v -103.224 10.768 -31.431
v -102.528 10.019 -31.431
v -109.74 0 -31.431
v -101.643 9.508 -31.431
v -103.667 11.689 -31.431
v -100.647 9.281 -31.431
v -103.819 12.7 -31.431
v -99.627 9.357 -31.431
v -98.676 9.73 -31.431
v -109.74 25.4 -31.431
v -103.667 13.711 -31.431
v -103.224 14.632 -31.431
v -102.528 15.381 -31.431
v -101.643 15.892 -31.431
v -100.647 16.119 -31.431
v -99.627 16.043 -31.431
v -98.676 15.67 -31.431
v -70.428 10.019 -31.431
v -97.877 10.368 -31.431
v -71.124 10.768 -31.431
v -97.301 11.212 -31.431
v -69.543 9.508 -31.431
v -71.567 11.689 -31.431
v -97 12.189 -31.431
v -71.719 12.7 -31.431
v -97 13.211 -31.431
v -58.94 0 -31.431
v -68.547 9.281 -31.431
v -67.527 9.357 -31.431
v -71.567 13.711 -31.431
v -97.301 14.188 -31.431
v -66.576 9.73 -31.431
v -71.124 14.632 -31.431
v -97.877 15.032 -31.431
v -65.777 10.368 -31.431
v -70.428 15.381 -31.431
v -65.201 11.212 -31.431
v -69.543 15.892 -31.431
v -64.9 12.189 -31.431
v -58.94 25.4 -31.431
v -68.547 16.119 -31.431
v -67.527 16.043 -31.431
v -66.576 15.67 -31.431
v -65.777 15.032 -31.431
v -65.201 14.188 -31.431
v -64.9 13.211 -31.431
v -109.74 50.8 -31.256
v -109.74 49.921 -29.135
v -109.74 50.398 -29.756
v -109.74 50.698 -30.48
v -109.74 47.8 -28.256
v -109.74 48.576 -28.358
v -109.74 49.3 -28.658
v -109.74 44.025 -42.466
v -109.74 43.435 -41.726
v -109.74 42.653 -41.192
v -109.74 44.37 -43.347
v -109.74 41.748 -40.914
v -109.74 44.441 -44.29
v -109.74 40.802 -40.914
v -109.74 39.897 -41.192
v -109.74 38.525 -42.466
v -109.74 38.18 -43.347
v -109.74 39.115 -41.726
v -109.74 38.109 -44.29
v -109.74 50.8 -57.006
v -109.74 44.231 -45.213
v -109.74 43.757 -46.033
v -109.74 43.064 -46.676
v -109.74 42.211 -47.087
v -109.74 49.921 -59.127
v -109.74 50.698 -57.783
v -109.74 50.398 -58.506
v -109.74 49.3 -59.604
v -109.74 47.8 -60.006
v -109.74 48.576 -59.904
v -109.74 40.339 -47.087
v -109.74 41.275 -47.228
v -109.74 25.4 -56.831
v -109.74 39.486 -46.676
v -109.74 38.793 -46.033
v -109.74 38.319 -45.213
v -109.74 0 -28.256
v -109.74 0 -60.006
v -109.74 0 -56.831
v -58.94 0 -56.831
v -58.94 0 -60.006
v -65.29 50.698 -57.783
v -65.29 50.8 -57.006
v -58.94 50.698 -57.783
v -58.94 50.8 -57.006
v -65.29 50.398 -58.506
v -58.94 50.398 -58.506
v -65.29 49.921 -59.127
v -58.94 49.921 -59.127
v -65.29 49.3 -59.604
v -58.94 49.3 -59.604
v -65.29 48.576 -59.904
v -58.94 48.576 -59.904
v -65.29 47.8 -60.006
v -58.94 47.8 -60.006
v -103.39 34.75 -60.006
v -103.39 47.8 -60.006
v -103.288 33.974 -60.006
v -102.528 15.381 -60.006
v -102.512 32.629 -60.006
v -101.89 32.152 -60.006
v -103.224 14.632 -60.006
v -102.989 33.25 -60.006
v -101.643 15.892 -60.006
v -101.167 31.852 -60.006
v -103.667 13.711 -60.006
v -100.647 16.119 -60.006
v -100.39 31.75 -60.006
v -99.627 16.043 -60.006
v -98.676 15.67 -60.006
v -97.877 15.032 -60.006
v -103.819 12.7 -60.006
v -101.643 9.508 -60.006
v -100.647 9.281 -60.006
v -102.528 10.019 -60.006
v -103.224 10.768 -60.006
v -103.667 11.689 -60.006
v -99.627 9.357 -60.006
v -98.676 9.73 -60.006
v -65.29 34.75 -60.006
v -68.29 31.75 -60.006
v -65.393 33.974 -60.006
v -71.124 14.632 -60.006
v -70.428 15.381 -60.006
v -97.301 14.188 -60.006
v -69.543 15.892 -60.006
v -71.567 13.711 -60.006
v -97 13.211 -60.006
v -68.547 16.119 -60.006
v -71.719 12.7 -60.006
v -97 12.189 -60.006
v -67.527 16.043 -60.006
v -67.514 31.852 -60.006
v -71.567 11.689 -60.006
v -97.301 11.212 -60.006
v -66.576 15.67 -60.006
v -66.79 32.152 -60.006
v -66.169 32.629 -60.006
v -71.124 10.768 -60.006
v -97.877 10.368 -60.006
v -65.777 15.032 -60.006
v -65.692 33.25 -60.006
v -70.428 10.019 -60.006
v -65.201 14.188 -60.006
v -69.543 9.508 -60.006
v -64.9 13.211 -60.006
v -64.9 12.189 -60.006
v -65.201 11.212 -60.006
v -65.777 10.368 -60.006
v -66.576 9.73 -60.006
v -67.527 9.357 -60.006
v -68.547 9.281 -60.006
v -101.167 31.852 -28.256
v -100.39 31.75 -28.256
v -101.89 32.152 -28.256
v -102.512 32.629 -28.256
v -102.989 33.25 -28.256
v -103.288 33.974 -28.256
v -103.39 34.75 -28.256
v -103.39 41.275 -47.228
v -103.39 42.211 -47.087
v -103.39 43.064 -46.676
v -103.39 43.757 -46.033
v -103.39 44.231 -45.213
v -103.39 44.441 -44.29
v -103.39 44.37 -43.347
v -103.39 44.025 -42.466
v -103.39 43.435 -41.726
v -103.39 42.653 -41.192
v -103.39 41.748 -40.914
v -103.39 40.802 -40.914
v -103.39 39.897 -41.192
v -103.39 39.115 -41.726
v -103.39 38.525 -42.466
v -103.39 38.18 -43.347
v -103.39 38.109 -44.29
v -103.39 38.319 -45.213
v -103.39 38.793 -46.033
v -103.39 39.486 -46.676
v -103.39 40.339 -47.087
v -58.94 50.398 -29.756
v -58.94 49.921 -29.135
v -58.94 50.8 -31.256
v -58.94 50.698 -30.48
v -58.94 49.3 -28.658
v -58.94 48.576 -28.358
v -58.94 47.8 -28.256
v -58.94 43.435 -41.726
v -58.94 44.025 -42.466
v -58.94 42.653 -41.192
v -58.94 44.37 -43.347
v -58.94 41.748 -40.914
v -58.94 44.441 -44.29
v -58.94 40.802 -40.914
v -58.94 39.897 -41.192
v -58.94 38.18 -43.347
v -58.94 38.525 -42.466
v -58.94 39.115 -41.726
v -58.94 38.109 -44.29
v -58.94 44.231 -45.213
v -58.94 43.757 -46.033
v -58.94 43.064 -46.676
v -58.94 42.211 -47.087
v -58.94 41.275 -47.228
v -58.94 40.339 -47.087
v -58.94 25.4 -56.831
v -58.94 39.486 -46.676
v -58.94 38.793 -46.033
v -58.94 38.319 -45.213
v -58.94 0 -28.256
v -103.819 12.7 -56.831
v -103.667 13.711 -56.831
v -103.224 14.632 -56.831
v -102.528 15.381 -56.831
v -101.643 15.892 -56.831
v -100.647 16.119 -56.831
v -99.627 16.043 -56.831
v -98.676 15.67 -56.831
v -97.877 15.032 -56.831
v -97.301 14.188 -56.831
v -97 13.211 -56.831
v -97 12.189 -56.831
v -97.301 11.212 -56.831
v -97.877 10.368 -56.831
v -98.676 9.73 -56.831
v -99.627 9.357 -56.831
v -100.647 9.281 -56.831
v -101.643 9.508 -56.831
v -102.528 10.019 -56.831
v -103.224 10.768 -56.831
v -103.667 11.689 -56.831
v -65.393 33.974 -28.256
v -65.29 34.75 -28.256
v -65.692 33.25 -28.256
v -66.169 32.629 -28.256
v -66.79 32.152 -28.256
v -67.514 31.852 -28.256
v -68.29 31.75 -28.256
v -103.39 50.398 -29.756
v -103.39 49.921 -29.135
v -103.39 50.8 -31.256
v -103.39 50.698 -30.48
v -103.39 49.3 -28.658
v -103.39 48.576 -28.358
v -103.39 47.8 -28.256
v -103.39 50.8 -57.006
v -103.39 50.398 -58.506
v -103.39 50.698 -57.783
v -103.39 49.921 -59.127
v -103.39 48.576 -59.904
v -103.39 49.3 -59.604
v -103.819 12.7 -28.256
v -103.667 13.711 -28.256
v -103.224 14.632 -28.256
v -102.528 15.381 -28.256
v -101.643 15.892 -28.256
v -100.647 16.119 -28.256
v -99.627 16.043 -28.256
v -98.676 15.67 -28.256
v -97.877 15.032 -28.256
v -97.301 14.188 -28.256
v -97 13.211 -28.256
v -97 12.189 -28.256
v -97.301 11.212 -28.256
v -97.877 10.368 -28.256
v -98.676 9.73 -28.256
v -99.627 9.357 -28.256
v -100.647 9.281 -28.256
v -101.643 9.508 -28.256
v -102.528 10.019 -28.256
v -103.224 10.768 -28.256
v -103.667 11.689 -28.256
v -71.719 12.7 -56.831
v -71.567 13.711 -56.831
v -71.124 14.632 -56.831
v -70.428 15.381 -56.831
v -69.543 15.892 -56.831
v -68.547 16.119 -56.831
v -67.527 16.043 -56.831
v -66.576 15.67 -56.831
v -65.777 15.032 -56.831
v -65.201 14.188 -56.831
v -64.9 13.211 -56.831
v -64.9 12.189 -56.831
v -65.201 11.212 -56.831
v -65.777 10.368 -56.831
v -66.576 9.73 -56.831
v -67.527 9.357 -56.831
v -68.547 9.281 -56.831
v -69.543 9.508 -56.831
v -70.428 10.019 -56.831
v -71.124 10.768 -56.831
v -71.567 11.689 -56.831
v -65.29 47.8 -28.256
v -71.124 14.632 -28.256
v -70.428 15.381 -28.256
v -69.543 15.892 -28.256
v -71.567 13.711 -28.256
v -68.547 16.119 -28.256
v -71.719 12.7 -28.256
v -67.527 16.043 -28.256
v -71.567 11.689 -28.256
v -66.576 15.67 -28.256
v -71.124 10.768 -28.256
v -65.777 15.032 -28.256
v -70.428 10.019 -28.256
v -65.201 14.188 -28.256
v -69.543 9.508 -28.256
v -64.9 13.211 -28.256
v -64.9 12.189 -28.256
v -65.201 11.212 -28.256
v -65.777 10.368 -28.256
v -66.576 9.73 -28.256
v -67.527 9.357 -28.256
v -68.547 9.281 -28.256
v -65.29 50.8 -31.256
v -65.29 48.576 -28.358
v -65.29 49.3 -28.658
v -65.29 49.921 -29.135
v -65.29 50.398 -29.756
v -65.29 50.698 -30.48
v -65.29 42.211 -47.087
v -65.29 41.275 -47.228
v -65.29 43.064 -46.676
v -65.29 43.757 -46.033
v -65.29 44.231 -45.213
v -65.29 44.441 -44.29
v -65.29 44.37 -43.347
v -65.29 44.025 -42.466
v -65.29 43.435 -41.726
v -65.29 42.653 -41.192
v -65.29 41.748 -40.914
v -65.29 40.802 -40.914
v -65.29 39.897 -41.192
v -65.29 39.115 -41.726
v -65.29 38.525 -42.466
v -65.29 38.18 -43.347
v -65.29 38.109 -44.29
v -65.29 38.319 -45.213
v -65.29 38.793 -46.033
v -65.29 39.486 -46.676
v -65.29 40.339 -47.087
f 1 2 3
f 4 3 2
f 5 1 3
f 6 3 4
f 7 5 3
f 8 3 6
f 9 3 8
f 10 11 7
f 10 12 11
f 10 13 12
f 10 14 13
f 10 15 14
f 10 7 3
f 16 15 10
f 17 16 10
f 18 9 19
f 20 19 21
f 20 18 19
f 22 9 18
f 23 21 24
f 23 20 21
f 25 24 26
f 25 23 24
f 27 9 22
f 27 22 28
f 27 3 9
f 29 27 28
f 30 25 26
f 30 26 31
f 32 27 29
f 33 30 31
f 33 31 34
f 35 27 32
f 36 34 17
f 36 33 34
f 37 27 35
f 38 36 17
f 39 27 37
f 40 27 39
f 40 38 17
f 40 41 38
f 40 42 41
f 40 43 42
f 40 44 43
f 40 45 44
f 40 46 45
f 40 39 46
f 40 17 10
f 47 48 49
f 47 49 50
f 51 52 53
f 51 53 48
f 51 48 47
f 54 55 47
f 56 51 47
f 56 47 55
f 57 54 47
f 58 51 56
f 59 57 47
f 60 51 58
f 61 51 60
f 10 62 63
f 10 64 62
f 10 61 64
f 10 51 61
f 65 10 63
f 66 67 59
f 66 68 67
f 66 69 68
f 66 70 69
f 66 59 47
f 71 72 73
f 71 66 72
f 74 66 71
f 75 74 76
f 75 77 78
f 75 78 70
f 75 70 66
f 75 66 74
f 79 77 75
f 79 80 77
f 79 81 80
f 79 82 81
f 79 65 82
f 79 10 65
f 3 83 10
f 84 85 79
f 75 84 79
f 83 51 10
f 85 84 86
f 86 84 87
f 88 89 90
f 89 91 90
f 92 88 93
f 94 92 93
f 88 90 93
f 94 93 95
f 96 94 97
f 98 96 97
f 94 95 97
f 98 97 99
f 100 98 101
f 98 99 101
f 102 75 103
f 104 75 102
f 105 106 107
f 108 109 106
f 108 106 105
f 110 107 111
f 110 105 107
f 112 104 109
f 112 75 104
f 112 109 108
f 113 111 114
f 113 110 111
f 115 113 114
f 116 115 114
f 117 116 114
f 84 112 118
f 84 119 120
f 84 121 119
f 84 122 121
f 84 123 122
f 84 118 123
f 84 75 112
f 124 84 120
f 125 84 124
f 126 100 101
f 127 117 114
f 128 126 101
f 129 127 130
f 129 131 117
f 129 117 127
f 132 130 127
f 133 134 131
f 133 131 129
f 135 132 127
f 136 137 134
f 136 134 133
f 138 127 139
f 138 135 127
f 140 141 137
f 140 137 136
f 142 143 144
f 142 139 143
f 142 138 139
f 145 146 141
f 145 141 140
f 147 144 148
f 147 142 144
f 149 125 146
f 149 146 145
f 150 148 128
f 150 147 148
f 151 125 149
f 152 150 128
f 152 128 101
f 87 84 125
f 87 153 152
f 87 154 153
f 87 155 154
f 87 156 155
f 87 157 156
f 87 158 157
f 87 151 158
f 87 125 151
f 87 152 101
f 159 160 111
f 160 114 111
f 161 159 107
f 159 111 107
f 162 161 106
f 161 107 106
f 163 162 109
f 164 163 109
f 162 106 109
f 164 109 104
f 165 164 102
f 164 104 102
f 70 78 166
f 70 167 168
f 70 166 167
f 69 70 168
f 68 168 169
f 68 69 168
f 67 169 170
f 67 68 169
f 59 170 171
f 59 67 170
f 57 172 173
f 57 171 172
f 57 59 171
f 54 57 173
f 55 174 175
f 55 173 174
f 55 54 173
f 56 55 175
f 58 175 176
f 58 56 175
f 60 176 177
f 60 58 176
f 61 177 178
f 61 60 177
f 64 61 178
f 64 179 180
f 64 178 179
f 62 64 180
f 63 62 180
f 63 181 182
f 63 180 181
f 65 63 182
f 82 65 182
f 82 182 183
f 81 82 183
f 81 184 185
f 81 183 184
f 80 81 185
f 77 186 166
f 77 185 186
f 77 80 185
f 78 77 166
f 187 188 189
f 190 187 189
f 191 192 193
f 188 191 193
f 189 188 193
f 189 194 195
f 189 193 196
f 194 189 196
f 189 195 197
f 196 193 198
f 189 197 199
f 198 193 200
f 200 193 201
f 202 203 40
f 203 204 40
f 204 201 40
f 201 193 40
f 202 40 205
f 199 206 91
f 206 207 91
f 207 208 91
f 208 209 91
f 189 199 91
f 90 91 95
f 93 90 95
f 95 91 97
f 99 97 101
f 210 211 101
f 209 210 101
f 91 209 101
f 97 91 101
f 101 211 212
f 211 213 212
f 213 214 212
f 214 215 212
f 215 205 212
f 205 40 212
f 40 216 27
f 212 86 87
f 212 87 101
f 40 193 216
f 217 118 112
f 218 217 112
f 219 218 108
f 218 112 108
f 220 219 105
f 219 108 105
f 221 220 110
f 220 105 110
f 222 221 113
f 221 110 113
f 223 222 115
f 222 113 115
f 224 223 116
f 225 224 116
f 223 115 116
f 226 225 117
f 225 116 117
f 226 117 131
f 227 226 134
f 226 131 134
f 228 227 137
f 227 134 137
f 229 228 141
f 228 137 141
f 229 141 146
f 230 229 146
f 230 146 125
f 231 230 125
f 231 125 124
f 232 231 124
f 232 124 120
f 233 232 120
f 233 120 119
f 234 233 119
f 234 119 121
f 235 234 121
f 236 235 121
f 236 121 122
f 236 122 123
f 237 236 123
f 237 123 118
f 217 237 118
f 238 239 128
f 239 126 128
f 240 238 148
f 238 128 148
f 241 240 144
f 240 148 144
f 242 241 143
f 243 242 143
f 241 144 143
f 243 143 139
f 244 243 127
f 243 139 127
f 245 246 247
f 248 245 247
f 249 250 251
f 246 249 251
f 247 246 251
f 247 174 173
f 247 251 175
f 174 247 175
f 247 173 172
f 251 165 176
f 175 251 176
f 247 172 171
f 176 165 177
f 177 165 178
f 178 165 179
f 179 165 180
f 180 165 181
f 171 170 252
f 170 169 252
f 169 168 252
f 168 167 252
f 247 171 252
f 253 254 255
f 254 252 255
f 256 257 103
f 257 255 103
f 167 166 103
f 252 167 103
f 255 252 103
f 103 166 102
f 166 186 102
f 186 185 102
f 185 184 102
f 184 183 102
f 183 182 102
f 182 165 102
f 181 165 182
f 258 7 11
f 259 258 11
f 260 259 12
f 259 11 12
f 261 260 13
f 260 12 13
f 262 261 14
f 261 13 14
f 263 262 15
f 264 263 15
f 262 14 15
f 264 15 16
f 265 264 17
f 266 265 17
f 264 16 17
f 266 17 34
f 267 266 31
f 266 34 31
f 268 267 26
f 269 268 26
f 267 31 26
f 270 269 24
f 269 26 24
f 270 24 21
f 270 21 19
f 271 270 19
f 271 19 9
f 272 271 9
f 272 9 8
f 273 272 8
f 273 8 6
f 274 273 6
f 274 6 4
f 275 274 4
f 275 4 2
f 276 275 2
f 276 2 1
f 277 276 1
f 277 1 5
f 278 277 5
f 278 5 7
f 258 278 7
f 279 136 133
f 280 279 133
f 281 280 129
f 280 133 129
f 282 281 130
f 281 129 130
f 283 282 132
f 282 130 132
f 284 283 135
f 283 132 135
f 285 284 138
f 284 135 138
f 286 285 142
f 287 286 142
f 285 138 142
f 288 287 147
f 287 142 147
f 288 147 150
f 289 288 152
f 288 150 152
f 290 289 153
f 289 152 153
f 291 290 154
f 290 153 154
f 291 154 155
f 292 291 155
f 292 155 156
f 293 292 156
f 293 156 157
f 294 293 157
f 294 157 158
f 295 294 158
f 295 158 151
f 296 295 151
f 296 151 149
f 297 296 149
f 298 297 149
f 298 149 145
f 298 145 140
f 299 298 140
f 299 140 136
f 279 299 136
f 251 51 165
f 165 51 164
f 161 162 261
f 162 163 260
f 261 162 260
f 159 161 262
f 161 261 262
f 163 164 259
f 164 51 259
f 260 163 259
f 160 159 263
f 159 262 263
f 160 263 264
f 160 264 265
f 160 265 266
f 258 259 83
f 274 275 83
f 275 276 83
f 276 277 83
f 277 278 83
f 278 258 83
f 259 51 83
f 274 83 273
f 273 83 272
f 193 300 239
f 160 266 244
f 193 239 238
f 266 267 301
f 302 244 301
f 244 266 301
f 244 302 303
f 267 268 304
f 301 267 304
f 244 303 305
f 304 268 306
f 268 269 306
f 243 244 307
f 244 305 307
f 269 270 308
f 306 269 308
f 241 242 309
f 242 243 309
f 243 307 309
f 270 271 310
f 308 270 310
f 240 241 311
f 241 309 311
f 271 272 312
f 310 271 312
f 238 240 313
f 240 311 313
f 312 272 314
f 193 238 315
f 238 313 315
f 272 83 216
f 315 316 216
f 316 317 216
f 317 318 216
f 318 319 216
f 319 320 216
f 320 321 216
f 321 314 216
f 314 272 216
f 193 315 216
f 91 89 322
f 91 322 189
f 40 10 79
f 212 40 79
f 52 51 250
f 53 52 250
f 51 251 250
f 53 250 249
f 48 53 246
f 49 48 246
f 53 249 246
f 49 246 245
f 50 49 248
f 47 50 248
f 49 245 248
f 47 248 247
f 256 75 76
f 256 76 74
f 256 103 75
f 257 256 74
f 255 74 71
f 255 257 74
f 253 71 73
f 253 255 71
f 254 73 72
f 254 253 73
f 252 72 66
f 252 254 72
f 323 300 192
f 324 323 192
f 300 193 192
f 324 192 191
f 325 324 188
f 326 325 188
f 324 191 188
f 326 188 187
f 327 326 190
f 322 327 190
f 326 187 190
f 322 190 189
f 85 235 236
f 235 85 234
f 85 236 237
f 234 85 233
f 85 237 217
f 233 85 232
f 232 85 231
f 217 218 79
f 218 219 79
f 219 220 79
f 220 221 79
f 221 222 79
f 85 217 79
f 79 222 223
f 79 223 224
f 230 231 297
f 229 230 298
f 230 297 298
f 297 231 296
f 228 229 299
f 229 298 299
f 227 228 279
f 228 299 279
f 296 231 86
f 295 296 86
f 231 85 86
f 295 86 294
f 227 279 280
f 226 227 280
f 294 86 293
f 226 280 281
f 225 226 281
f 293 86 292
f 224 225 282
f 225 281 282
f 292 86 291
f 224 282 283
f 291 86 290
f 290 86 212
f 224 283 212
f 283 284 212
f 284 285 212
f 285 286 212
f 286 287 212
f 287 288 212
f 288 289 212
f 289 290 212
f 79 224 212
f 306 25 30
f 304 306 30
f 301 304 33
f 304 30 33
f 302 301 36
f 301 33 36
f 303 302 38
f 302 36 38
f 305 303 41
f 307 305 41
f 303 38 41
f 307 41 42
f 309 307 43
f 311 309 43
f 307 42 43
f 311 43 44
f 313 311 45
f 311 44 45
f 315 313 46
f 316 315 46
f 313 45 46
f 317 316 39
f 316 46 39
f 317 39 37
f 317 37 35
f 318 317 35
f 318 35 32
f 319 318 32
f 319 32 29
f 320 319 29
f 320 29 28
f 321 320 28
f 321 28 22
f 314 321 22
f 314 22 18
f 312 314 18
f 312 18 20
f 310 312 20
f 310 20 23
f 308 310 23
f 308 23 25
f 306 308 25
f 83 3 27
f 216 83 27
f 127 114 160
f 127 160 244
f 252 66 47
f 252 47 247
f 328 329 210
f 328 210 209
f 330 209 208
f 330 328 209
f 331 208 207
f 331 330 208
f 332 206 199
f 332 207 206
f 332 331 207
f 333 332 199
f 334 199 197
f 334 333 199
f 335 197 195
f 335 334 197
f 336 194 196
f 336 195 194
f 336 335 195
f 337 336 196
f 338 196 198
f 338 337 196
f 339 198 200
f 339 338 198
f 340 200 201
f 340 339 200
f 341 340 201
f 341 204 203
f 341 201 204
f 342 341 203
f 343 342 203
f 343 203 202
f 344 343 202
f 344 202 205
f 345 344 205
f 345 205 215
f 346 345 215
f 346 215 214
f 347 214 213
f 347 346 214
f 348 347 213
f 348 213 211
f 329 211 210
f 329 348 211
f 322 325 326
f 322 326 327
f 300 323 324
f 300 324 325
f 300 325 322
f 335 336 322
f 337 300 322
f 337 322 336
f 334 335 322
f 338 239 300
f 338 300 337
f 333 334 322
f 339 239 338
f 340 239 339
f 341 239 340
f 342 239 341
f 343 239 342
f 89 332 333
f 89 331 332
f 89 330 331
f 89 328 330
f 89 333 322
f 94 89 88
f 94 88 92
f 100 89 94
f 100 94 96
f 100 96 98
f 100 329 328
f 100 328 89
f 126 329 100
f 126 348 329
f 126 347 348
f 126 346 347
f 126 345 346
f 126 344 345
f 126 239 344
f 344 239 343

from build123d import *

# Parameters (mm, degrees)
SKETCH1_W               = 50.8
SKETCH1_H               = 31.75
BOSS_EXTRUDE1_DEPTH     = 31.75
SKETCH2_W               = 25.4
SKETCH2_H               = 25.4
CUT_EXTRUDE1_DEPTH      = 85.79053849
SKETCH3_W               = 6.35
SKETCH3_H               = 31.75
BOSS_EXTRUDE2_DEPTH     = 19.05
SKETCH4_W               = 6.35
SKETCH4_H               = 31.75
BOSS_EXTRUDE3_DEPTH     = 19.05
CUT_EXTRUDE2_DEPTH      = 91.317082645
CUT_EXTRUDE2_DEPTH_BACK = 91.317082645
SKETCH5_R               = 3.175
FILLET1_R               = 3
SKETCH6_R               = 3.429
CUT_EXTRUDE3_DEPTH      = 126.026704643
SKETCH7_R               = 3.429
CUT_EXTRUDE4_DEPTH      = 126.026704643


with BuildPart() as part:
    # Sketch1 → Boss-Extrude1 (new body)
    with BuildSketch(Plane(origin=(0, 0, 0), x_dir=(1, 0, 0), z_dir=(0, 1, 0))):
        with Locations((-84.340486484, 44.131107335)):
            Rectangle(SKETCH1_W, SKETCH1_H)
    extrude(amount=BOSS_EXTRUDE1_DEPTH)

    # Sketch2 → Cut-Extrude1 (cut, through all)
    with BuildSketch(Plane(origin=(-58.940486484, 0, 0), x_dir=(0, 0, -1), z_dir=(1, 0, 0))):
        with Locations((44.131107335, 12.7)):
            Rectangle(SKETCH2_W, SKETCH2_H)
    extrude(amount=-CUT_EXTRUDE1_DEPTH, mode=Mode.SUBTRACT)

    # Sketch3 → Boss-Extrude2 (add)
    with BuildSketch(Plane(origin=(0, 31.75, 0), x_dir=(1, 0, 0), z_dir=(0, 1, 0))):
        with Locations((-106.565486484, 44.131107335)):
            Rectangle(SKETCH3_W, SKETCH3_H)
    extrude(amount=BOSS_EXTRUDE2_DEPTH)

    # Sketch4 → Boss-Extrude3 (add)
    with BuildSketch(Plane(origin=(0, 31.75, 0), x_dir=(1, 0, 0), z_dir=(0, 1, 0))):
        with Locations((-62.115486484, 44.131107335)):
            Rectangle(SKETCH4_W, SKETCH4_H)
    extrude(amount=BOSS_EXTRUDE3_DEPTH)

    # Sketch5 → Cut-Extrude2 (cut, two sides: drawn at the far end of the back side and taken through both)
    with BuildSketch(Plane(origin=(-103.390486484, 0, 0), x_dir=(0, 0, -1), z_dir=(1, 0, 0)).offset(-CUT_EXTRUDE2_DEPTH_BACK)):
        with Locations((44.053057169, 41.275)):
            Circle(SKETCH5_R)
    extrude(amount=CUT_EXTRUDE2_DEPTH + CUT_EXTRUDE2_DEPTH_BACK, mode=Mode.SUBTRACT)

    # Fillet1
    fillet1_edges = [part.edges().sort_by_distance(p)[0] for p in [
        (-106.565486484, 50.8, -60.006107335),
        (-106.565486484, 50.8, -28.256107335),
        (-62.115486484, 50.8, -28.256107335),
        (-62.115486484, 50.8, -60.006107335),
        (-65.290486484, 31.75, -44.131107335),
        (-103.390486484, 31.75, -44.131107335),
    ]]
    fillet(fillet1_edges, radius=FILLET1_R)

    # Sketch6 → Cut-Extrude3 (cut, through all)
    with BuildSketch(Plane(origin=(0, 0, -60.006107335), x_dir=(-1, 0, 0), z_dir=(0, 0, -1))):
        with Locations((68.290486484, 12.7)):
            Circle(SKETCH6_R)
    extrude(amount=-CUT_EXTRUDE3_DEPTH, mode=Mode.SUBTRACT)

    # Sketch7 → Cut-Extrude4 (cut, through all)
    with BuildSketch(Plane(origin=(0, 0, -60.006107335), x_dir=(-1, 0, 0), z_dir=(0, 0, -1))):
        with Locations((100.390486484, 12.7)):
            Circle(SKETCH7_R)
    extrude(amount=-CUT_EXTRUDE4_DEPTH, mode=Mode.SUBTRACT)


solid = part.part
